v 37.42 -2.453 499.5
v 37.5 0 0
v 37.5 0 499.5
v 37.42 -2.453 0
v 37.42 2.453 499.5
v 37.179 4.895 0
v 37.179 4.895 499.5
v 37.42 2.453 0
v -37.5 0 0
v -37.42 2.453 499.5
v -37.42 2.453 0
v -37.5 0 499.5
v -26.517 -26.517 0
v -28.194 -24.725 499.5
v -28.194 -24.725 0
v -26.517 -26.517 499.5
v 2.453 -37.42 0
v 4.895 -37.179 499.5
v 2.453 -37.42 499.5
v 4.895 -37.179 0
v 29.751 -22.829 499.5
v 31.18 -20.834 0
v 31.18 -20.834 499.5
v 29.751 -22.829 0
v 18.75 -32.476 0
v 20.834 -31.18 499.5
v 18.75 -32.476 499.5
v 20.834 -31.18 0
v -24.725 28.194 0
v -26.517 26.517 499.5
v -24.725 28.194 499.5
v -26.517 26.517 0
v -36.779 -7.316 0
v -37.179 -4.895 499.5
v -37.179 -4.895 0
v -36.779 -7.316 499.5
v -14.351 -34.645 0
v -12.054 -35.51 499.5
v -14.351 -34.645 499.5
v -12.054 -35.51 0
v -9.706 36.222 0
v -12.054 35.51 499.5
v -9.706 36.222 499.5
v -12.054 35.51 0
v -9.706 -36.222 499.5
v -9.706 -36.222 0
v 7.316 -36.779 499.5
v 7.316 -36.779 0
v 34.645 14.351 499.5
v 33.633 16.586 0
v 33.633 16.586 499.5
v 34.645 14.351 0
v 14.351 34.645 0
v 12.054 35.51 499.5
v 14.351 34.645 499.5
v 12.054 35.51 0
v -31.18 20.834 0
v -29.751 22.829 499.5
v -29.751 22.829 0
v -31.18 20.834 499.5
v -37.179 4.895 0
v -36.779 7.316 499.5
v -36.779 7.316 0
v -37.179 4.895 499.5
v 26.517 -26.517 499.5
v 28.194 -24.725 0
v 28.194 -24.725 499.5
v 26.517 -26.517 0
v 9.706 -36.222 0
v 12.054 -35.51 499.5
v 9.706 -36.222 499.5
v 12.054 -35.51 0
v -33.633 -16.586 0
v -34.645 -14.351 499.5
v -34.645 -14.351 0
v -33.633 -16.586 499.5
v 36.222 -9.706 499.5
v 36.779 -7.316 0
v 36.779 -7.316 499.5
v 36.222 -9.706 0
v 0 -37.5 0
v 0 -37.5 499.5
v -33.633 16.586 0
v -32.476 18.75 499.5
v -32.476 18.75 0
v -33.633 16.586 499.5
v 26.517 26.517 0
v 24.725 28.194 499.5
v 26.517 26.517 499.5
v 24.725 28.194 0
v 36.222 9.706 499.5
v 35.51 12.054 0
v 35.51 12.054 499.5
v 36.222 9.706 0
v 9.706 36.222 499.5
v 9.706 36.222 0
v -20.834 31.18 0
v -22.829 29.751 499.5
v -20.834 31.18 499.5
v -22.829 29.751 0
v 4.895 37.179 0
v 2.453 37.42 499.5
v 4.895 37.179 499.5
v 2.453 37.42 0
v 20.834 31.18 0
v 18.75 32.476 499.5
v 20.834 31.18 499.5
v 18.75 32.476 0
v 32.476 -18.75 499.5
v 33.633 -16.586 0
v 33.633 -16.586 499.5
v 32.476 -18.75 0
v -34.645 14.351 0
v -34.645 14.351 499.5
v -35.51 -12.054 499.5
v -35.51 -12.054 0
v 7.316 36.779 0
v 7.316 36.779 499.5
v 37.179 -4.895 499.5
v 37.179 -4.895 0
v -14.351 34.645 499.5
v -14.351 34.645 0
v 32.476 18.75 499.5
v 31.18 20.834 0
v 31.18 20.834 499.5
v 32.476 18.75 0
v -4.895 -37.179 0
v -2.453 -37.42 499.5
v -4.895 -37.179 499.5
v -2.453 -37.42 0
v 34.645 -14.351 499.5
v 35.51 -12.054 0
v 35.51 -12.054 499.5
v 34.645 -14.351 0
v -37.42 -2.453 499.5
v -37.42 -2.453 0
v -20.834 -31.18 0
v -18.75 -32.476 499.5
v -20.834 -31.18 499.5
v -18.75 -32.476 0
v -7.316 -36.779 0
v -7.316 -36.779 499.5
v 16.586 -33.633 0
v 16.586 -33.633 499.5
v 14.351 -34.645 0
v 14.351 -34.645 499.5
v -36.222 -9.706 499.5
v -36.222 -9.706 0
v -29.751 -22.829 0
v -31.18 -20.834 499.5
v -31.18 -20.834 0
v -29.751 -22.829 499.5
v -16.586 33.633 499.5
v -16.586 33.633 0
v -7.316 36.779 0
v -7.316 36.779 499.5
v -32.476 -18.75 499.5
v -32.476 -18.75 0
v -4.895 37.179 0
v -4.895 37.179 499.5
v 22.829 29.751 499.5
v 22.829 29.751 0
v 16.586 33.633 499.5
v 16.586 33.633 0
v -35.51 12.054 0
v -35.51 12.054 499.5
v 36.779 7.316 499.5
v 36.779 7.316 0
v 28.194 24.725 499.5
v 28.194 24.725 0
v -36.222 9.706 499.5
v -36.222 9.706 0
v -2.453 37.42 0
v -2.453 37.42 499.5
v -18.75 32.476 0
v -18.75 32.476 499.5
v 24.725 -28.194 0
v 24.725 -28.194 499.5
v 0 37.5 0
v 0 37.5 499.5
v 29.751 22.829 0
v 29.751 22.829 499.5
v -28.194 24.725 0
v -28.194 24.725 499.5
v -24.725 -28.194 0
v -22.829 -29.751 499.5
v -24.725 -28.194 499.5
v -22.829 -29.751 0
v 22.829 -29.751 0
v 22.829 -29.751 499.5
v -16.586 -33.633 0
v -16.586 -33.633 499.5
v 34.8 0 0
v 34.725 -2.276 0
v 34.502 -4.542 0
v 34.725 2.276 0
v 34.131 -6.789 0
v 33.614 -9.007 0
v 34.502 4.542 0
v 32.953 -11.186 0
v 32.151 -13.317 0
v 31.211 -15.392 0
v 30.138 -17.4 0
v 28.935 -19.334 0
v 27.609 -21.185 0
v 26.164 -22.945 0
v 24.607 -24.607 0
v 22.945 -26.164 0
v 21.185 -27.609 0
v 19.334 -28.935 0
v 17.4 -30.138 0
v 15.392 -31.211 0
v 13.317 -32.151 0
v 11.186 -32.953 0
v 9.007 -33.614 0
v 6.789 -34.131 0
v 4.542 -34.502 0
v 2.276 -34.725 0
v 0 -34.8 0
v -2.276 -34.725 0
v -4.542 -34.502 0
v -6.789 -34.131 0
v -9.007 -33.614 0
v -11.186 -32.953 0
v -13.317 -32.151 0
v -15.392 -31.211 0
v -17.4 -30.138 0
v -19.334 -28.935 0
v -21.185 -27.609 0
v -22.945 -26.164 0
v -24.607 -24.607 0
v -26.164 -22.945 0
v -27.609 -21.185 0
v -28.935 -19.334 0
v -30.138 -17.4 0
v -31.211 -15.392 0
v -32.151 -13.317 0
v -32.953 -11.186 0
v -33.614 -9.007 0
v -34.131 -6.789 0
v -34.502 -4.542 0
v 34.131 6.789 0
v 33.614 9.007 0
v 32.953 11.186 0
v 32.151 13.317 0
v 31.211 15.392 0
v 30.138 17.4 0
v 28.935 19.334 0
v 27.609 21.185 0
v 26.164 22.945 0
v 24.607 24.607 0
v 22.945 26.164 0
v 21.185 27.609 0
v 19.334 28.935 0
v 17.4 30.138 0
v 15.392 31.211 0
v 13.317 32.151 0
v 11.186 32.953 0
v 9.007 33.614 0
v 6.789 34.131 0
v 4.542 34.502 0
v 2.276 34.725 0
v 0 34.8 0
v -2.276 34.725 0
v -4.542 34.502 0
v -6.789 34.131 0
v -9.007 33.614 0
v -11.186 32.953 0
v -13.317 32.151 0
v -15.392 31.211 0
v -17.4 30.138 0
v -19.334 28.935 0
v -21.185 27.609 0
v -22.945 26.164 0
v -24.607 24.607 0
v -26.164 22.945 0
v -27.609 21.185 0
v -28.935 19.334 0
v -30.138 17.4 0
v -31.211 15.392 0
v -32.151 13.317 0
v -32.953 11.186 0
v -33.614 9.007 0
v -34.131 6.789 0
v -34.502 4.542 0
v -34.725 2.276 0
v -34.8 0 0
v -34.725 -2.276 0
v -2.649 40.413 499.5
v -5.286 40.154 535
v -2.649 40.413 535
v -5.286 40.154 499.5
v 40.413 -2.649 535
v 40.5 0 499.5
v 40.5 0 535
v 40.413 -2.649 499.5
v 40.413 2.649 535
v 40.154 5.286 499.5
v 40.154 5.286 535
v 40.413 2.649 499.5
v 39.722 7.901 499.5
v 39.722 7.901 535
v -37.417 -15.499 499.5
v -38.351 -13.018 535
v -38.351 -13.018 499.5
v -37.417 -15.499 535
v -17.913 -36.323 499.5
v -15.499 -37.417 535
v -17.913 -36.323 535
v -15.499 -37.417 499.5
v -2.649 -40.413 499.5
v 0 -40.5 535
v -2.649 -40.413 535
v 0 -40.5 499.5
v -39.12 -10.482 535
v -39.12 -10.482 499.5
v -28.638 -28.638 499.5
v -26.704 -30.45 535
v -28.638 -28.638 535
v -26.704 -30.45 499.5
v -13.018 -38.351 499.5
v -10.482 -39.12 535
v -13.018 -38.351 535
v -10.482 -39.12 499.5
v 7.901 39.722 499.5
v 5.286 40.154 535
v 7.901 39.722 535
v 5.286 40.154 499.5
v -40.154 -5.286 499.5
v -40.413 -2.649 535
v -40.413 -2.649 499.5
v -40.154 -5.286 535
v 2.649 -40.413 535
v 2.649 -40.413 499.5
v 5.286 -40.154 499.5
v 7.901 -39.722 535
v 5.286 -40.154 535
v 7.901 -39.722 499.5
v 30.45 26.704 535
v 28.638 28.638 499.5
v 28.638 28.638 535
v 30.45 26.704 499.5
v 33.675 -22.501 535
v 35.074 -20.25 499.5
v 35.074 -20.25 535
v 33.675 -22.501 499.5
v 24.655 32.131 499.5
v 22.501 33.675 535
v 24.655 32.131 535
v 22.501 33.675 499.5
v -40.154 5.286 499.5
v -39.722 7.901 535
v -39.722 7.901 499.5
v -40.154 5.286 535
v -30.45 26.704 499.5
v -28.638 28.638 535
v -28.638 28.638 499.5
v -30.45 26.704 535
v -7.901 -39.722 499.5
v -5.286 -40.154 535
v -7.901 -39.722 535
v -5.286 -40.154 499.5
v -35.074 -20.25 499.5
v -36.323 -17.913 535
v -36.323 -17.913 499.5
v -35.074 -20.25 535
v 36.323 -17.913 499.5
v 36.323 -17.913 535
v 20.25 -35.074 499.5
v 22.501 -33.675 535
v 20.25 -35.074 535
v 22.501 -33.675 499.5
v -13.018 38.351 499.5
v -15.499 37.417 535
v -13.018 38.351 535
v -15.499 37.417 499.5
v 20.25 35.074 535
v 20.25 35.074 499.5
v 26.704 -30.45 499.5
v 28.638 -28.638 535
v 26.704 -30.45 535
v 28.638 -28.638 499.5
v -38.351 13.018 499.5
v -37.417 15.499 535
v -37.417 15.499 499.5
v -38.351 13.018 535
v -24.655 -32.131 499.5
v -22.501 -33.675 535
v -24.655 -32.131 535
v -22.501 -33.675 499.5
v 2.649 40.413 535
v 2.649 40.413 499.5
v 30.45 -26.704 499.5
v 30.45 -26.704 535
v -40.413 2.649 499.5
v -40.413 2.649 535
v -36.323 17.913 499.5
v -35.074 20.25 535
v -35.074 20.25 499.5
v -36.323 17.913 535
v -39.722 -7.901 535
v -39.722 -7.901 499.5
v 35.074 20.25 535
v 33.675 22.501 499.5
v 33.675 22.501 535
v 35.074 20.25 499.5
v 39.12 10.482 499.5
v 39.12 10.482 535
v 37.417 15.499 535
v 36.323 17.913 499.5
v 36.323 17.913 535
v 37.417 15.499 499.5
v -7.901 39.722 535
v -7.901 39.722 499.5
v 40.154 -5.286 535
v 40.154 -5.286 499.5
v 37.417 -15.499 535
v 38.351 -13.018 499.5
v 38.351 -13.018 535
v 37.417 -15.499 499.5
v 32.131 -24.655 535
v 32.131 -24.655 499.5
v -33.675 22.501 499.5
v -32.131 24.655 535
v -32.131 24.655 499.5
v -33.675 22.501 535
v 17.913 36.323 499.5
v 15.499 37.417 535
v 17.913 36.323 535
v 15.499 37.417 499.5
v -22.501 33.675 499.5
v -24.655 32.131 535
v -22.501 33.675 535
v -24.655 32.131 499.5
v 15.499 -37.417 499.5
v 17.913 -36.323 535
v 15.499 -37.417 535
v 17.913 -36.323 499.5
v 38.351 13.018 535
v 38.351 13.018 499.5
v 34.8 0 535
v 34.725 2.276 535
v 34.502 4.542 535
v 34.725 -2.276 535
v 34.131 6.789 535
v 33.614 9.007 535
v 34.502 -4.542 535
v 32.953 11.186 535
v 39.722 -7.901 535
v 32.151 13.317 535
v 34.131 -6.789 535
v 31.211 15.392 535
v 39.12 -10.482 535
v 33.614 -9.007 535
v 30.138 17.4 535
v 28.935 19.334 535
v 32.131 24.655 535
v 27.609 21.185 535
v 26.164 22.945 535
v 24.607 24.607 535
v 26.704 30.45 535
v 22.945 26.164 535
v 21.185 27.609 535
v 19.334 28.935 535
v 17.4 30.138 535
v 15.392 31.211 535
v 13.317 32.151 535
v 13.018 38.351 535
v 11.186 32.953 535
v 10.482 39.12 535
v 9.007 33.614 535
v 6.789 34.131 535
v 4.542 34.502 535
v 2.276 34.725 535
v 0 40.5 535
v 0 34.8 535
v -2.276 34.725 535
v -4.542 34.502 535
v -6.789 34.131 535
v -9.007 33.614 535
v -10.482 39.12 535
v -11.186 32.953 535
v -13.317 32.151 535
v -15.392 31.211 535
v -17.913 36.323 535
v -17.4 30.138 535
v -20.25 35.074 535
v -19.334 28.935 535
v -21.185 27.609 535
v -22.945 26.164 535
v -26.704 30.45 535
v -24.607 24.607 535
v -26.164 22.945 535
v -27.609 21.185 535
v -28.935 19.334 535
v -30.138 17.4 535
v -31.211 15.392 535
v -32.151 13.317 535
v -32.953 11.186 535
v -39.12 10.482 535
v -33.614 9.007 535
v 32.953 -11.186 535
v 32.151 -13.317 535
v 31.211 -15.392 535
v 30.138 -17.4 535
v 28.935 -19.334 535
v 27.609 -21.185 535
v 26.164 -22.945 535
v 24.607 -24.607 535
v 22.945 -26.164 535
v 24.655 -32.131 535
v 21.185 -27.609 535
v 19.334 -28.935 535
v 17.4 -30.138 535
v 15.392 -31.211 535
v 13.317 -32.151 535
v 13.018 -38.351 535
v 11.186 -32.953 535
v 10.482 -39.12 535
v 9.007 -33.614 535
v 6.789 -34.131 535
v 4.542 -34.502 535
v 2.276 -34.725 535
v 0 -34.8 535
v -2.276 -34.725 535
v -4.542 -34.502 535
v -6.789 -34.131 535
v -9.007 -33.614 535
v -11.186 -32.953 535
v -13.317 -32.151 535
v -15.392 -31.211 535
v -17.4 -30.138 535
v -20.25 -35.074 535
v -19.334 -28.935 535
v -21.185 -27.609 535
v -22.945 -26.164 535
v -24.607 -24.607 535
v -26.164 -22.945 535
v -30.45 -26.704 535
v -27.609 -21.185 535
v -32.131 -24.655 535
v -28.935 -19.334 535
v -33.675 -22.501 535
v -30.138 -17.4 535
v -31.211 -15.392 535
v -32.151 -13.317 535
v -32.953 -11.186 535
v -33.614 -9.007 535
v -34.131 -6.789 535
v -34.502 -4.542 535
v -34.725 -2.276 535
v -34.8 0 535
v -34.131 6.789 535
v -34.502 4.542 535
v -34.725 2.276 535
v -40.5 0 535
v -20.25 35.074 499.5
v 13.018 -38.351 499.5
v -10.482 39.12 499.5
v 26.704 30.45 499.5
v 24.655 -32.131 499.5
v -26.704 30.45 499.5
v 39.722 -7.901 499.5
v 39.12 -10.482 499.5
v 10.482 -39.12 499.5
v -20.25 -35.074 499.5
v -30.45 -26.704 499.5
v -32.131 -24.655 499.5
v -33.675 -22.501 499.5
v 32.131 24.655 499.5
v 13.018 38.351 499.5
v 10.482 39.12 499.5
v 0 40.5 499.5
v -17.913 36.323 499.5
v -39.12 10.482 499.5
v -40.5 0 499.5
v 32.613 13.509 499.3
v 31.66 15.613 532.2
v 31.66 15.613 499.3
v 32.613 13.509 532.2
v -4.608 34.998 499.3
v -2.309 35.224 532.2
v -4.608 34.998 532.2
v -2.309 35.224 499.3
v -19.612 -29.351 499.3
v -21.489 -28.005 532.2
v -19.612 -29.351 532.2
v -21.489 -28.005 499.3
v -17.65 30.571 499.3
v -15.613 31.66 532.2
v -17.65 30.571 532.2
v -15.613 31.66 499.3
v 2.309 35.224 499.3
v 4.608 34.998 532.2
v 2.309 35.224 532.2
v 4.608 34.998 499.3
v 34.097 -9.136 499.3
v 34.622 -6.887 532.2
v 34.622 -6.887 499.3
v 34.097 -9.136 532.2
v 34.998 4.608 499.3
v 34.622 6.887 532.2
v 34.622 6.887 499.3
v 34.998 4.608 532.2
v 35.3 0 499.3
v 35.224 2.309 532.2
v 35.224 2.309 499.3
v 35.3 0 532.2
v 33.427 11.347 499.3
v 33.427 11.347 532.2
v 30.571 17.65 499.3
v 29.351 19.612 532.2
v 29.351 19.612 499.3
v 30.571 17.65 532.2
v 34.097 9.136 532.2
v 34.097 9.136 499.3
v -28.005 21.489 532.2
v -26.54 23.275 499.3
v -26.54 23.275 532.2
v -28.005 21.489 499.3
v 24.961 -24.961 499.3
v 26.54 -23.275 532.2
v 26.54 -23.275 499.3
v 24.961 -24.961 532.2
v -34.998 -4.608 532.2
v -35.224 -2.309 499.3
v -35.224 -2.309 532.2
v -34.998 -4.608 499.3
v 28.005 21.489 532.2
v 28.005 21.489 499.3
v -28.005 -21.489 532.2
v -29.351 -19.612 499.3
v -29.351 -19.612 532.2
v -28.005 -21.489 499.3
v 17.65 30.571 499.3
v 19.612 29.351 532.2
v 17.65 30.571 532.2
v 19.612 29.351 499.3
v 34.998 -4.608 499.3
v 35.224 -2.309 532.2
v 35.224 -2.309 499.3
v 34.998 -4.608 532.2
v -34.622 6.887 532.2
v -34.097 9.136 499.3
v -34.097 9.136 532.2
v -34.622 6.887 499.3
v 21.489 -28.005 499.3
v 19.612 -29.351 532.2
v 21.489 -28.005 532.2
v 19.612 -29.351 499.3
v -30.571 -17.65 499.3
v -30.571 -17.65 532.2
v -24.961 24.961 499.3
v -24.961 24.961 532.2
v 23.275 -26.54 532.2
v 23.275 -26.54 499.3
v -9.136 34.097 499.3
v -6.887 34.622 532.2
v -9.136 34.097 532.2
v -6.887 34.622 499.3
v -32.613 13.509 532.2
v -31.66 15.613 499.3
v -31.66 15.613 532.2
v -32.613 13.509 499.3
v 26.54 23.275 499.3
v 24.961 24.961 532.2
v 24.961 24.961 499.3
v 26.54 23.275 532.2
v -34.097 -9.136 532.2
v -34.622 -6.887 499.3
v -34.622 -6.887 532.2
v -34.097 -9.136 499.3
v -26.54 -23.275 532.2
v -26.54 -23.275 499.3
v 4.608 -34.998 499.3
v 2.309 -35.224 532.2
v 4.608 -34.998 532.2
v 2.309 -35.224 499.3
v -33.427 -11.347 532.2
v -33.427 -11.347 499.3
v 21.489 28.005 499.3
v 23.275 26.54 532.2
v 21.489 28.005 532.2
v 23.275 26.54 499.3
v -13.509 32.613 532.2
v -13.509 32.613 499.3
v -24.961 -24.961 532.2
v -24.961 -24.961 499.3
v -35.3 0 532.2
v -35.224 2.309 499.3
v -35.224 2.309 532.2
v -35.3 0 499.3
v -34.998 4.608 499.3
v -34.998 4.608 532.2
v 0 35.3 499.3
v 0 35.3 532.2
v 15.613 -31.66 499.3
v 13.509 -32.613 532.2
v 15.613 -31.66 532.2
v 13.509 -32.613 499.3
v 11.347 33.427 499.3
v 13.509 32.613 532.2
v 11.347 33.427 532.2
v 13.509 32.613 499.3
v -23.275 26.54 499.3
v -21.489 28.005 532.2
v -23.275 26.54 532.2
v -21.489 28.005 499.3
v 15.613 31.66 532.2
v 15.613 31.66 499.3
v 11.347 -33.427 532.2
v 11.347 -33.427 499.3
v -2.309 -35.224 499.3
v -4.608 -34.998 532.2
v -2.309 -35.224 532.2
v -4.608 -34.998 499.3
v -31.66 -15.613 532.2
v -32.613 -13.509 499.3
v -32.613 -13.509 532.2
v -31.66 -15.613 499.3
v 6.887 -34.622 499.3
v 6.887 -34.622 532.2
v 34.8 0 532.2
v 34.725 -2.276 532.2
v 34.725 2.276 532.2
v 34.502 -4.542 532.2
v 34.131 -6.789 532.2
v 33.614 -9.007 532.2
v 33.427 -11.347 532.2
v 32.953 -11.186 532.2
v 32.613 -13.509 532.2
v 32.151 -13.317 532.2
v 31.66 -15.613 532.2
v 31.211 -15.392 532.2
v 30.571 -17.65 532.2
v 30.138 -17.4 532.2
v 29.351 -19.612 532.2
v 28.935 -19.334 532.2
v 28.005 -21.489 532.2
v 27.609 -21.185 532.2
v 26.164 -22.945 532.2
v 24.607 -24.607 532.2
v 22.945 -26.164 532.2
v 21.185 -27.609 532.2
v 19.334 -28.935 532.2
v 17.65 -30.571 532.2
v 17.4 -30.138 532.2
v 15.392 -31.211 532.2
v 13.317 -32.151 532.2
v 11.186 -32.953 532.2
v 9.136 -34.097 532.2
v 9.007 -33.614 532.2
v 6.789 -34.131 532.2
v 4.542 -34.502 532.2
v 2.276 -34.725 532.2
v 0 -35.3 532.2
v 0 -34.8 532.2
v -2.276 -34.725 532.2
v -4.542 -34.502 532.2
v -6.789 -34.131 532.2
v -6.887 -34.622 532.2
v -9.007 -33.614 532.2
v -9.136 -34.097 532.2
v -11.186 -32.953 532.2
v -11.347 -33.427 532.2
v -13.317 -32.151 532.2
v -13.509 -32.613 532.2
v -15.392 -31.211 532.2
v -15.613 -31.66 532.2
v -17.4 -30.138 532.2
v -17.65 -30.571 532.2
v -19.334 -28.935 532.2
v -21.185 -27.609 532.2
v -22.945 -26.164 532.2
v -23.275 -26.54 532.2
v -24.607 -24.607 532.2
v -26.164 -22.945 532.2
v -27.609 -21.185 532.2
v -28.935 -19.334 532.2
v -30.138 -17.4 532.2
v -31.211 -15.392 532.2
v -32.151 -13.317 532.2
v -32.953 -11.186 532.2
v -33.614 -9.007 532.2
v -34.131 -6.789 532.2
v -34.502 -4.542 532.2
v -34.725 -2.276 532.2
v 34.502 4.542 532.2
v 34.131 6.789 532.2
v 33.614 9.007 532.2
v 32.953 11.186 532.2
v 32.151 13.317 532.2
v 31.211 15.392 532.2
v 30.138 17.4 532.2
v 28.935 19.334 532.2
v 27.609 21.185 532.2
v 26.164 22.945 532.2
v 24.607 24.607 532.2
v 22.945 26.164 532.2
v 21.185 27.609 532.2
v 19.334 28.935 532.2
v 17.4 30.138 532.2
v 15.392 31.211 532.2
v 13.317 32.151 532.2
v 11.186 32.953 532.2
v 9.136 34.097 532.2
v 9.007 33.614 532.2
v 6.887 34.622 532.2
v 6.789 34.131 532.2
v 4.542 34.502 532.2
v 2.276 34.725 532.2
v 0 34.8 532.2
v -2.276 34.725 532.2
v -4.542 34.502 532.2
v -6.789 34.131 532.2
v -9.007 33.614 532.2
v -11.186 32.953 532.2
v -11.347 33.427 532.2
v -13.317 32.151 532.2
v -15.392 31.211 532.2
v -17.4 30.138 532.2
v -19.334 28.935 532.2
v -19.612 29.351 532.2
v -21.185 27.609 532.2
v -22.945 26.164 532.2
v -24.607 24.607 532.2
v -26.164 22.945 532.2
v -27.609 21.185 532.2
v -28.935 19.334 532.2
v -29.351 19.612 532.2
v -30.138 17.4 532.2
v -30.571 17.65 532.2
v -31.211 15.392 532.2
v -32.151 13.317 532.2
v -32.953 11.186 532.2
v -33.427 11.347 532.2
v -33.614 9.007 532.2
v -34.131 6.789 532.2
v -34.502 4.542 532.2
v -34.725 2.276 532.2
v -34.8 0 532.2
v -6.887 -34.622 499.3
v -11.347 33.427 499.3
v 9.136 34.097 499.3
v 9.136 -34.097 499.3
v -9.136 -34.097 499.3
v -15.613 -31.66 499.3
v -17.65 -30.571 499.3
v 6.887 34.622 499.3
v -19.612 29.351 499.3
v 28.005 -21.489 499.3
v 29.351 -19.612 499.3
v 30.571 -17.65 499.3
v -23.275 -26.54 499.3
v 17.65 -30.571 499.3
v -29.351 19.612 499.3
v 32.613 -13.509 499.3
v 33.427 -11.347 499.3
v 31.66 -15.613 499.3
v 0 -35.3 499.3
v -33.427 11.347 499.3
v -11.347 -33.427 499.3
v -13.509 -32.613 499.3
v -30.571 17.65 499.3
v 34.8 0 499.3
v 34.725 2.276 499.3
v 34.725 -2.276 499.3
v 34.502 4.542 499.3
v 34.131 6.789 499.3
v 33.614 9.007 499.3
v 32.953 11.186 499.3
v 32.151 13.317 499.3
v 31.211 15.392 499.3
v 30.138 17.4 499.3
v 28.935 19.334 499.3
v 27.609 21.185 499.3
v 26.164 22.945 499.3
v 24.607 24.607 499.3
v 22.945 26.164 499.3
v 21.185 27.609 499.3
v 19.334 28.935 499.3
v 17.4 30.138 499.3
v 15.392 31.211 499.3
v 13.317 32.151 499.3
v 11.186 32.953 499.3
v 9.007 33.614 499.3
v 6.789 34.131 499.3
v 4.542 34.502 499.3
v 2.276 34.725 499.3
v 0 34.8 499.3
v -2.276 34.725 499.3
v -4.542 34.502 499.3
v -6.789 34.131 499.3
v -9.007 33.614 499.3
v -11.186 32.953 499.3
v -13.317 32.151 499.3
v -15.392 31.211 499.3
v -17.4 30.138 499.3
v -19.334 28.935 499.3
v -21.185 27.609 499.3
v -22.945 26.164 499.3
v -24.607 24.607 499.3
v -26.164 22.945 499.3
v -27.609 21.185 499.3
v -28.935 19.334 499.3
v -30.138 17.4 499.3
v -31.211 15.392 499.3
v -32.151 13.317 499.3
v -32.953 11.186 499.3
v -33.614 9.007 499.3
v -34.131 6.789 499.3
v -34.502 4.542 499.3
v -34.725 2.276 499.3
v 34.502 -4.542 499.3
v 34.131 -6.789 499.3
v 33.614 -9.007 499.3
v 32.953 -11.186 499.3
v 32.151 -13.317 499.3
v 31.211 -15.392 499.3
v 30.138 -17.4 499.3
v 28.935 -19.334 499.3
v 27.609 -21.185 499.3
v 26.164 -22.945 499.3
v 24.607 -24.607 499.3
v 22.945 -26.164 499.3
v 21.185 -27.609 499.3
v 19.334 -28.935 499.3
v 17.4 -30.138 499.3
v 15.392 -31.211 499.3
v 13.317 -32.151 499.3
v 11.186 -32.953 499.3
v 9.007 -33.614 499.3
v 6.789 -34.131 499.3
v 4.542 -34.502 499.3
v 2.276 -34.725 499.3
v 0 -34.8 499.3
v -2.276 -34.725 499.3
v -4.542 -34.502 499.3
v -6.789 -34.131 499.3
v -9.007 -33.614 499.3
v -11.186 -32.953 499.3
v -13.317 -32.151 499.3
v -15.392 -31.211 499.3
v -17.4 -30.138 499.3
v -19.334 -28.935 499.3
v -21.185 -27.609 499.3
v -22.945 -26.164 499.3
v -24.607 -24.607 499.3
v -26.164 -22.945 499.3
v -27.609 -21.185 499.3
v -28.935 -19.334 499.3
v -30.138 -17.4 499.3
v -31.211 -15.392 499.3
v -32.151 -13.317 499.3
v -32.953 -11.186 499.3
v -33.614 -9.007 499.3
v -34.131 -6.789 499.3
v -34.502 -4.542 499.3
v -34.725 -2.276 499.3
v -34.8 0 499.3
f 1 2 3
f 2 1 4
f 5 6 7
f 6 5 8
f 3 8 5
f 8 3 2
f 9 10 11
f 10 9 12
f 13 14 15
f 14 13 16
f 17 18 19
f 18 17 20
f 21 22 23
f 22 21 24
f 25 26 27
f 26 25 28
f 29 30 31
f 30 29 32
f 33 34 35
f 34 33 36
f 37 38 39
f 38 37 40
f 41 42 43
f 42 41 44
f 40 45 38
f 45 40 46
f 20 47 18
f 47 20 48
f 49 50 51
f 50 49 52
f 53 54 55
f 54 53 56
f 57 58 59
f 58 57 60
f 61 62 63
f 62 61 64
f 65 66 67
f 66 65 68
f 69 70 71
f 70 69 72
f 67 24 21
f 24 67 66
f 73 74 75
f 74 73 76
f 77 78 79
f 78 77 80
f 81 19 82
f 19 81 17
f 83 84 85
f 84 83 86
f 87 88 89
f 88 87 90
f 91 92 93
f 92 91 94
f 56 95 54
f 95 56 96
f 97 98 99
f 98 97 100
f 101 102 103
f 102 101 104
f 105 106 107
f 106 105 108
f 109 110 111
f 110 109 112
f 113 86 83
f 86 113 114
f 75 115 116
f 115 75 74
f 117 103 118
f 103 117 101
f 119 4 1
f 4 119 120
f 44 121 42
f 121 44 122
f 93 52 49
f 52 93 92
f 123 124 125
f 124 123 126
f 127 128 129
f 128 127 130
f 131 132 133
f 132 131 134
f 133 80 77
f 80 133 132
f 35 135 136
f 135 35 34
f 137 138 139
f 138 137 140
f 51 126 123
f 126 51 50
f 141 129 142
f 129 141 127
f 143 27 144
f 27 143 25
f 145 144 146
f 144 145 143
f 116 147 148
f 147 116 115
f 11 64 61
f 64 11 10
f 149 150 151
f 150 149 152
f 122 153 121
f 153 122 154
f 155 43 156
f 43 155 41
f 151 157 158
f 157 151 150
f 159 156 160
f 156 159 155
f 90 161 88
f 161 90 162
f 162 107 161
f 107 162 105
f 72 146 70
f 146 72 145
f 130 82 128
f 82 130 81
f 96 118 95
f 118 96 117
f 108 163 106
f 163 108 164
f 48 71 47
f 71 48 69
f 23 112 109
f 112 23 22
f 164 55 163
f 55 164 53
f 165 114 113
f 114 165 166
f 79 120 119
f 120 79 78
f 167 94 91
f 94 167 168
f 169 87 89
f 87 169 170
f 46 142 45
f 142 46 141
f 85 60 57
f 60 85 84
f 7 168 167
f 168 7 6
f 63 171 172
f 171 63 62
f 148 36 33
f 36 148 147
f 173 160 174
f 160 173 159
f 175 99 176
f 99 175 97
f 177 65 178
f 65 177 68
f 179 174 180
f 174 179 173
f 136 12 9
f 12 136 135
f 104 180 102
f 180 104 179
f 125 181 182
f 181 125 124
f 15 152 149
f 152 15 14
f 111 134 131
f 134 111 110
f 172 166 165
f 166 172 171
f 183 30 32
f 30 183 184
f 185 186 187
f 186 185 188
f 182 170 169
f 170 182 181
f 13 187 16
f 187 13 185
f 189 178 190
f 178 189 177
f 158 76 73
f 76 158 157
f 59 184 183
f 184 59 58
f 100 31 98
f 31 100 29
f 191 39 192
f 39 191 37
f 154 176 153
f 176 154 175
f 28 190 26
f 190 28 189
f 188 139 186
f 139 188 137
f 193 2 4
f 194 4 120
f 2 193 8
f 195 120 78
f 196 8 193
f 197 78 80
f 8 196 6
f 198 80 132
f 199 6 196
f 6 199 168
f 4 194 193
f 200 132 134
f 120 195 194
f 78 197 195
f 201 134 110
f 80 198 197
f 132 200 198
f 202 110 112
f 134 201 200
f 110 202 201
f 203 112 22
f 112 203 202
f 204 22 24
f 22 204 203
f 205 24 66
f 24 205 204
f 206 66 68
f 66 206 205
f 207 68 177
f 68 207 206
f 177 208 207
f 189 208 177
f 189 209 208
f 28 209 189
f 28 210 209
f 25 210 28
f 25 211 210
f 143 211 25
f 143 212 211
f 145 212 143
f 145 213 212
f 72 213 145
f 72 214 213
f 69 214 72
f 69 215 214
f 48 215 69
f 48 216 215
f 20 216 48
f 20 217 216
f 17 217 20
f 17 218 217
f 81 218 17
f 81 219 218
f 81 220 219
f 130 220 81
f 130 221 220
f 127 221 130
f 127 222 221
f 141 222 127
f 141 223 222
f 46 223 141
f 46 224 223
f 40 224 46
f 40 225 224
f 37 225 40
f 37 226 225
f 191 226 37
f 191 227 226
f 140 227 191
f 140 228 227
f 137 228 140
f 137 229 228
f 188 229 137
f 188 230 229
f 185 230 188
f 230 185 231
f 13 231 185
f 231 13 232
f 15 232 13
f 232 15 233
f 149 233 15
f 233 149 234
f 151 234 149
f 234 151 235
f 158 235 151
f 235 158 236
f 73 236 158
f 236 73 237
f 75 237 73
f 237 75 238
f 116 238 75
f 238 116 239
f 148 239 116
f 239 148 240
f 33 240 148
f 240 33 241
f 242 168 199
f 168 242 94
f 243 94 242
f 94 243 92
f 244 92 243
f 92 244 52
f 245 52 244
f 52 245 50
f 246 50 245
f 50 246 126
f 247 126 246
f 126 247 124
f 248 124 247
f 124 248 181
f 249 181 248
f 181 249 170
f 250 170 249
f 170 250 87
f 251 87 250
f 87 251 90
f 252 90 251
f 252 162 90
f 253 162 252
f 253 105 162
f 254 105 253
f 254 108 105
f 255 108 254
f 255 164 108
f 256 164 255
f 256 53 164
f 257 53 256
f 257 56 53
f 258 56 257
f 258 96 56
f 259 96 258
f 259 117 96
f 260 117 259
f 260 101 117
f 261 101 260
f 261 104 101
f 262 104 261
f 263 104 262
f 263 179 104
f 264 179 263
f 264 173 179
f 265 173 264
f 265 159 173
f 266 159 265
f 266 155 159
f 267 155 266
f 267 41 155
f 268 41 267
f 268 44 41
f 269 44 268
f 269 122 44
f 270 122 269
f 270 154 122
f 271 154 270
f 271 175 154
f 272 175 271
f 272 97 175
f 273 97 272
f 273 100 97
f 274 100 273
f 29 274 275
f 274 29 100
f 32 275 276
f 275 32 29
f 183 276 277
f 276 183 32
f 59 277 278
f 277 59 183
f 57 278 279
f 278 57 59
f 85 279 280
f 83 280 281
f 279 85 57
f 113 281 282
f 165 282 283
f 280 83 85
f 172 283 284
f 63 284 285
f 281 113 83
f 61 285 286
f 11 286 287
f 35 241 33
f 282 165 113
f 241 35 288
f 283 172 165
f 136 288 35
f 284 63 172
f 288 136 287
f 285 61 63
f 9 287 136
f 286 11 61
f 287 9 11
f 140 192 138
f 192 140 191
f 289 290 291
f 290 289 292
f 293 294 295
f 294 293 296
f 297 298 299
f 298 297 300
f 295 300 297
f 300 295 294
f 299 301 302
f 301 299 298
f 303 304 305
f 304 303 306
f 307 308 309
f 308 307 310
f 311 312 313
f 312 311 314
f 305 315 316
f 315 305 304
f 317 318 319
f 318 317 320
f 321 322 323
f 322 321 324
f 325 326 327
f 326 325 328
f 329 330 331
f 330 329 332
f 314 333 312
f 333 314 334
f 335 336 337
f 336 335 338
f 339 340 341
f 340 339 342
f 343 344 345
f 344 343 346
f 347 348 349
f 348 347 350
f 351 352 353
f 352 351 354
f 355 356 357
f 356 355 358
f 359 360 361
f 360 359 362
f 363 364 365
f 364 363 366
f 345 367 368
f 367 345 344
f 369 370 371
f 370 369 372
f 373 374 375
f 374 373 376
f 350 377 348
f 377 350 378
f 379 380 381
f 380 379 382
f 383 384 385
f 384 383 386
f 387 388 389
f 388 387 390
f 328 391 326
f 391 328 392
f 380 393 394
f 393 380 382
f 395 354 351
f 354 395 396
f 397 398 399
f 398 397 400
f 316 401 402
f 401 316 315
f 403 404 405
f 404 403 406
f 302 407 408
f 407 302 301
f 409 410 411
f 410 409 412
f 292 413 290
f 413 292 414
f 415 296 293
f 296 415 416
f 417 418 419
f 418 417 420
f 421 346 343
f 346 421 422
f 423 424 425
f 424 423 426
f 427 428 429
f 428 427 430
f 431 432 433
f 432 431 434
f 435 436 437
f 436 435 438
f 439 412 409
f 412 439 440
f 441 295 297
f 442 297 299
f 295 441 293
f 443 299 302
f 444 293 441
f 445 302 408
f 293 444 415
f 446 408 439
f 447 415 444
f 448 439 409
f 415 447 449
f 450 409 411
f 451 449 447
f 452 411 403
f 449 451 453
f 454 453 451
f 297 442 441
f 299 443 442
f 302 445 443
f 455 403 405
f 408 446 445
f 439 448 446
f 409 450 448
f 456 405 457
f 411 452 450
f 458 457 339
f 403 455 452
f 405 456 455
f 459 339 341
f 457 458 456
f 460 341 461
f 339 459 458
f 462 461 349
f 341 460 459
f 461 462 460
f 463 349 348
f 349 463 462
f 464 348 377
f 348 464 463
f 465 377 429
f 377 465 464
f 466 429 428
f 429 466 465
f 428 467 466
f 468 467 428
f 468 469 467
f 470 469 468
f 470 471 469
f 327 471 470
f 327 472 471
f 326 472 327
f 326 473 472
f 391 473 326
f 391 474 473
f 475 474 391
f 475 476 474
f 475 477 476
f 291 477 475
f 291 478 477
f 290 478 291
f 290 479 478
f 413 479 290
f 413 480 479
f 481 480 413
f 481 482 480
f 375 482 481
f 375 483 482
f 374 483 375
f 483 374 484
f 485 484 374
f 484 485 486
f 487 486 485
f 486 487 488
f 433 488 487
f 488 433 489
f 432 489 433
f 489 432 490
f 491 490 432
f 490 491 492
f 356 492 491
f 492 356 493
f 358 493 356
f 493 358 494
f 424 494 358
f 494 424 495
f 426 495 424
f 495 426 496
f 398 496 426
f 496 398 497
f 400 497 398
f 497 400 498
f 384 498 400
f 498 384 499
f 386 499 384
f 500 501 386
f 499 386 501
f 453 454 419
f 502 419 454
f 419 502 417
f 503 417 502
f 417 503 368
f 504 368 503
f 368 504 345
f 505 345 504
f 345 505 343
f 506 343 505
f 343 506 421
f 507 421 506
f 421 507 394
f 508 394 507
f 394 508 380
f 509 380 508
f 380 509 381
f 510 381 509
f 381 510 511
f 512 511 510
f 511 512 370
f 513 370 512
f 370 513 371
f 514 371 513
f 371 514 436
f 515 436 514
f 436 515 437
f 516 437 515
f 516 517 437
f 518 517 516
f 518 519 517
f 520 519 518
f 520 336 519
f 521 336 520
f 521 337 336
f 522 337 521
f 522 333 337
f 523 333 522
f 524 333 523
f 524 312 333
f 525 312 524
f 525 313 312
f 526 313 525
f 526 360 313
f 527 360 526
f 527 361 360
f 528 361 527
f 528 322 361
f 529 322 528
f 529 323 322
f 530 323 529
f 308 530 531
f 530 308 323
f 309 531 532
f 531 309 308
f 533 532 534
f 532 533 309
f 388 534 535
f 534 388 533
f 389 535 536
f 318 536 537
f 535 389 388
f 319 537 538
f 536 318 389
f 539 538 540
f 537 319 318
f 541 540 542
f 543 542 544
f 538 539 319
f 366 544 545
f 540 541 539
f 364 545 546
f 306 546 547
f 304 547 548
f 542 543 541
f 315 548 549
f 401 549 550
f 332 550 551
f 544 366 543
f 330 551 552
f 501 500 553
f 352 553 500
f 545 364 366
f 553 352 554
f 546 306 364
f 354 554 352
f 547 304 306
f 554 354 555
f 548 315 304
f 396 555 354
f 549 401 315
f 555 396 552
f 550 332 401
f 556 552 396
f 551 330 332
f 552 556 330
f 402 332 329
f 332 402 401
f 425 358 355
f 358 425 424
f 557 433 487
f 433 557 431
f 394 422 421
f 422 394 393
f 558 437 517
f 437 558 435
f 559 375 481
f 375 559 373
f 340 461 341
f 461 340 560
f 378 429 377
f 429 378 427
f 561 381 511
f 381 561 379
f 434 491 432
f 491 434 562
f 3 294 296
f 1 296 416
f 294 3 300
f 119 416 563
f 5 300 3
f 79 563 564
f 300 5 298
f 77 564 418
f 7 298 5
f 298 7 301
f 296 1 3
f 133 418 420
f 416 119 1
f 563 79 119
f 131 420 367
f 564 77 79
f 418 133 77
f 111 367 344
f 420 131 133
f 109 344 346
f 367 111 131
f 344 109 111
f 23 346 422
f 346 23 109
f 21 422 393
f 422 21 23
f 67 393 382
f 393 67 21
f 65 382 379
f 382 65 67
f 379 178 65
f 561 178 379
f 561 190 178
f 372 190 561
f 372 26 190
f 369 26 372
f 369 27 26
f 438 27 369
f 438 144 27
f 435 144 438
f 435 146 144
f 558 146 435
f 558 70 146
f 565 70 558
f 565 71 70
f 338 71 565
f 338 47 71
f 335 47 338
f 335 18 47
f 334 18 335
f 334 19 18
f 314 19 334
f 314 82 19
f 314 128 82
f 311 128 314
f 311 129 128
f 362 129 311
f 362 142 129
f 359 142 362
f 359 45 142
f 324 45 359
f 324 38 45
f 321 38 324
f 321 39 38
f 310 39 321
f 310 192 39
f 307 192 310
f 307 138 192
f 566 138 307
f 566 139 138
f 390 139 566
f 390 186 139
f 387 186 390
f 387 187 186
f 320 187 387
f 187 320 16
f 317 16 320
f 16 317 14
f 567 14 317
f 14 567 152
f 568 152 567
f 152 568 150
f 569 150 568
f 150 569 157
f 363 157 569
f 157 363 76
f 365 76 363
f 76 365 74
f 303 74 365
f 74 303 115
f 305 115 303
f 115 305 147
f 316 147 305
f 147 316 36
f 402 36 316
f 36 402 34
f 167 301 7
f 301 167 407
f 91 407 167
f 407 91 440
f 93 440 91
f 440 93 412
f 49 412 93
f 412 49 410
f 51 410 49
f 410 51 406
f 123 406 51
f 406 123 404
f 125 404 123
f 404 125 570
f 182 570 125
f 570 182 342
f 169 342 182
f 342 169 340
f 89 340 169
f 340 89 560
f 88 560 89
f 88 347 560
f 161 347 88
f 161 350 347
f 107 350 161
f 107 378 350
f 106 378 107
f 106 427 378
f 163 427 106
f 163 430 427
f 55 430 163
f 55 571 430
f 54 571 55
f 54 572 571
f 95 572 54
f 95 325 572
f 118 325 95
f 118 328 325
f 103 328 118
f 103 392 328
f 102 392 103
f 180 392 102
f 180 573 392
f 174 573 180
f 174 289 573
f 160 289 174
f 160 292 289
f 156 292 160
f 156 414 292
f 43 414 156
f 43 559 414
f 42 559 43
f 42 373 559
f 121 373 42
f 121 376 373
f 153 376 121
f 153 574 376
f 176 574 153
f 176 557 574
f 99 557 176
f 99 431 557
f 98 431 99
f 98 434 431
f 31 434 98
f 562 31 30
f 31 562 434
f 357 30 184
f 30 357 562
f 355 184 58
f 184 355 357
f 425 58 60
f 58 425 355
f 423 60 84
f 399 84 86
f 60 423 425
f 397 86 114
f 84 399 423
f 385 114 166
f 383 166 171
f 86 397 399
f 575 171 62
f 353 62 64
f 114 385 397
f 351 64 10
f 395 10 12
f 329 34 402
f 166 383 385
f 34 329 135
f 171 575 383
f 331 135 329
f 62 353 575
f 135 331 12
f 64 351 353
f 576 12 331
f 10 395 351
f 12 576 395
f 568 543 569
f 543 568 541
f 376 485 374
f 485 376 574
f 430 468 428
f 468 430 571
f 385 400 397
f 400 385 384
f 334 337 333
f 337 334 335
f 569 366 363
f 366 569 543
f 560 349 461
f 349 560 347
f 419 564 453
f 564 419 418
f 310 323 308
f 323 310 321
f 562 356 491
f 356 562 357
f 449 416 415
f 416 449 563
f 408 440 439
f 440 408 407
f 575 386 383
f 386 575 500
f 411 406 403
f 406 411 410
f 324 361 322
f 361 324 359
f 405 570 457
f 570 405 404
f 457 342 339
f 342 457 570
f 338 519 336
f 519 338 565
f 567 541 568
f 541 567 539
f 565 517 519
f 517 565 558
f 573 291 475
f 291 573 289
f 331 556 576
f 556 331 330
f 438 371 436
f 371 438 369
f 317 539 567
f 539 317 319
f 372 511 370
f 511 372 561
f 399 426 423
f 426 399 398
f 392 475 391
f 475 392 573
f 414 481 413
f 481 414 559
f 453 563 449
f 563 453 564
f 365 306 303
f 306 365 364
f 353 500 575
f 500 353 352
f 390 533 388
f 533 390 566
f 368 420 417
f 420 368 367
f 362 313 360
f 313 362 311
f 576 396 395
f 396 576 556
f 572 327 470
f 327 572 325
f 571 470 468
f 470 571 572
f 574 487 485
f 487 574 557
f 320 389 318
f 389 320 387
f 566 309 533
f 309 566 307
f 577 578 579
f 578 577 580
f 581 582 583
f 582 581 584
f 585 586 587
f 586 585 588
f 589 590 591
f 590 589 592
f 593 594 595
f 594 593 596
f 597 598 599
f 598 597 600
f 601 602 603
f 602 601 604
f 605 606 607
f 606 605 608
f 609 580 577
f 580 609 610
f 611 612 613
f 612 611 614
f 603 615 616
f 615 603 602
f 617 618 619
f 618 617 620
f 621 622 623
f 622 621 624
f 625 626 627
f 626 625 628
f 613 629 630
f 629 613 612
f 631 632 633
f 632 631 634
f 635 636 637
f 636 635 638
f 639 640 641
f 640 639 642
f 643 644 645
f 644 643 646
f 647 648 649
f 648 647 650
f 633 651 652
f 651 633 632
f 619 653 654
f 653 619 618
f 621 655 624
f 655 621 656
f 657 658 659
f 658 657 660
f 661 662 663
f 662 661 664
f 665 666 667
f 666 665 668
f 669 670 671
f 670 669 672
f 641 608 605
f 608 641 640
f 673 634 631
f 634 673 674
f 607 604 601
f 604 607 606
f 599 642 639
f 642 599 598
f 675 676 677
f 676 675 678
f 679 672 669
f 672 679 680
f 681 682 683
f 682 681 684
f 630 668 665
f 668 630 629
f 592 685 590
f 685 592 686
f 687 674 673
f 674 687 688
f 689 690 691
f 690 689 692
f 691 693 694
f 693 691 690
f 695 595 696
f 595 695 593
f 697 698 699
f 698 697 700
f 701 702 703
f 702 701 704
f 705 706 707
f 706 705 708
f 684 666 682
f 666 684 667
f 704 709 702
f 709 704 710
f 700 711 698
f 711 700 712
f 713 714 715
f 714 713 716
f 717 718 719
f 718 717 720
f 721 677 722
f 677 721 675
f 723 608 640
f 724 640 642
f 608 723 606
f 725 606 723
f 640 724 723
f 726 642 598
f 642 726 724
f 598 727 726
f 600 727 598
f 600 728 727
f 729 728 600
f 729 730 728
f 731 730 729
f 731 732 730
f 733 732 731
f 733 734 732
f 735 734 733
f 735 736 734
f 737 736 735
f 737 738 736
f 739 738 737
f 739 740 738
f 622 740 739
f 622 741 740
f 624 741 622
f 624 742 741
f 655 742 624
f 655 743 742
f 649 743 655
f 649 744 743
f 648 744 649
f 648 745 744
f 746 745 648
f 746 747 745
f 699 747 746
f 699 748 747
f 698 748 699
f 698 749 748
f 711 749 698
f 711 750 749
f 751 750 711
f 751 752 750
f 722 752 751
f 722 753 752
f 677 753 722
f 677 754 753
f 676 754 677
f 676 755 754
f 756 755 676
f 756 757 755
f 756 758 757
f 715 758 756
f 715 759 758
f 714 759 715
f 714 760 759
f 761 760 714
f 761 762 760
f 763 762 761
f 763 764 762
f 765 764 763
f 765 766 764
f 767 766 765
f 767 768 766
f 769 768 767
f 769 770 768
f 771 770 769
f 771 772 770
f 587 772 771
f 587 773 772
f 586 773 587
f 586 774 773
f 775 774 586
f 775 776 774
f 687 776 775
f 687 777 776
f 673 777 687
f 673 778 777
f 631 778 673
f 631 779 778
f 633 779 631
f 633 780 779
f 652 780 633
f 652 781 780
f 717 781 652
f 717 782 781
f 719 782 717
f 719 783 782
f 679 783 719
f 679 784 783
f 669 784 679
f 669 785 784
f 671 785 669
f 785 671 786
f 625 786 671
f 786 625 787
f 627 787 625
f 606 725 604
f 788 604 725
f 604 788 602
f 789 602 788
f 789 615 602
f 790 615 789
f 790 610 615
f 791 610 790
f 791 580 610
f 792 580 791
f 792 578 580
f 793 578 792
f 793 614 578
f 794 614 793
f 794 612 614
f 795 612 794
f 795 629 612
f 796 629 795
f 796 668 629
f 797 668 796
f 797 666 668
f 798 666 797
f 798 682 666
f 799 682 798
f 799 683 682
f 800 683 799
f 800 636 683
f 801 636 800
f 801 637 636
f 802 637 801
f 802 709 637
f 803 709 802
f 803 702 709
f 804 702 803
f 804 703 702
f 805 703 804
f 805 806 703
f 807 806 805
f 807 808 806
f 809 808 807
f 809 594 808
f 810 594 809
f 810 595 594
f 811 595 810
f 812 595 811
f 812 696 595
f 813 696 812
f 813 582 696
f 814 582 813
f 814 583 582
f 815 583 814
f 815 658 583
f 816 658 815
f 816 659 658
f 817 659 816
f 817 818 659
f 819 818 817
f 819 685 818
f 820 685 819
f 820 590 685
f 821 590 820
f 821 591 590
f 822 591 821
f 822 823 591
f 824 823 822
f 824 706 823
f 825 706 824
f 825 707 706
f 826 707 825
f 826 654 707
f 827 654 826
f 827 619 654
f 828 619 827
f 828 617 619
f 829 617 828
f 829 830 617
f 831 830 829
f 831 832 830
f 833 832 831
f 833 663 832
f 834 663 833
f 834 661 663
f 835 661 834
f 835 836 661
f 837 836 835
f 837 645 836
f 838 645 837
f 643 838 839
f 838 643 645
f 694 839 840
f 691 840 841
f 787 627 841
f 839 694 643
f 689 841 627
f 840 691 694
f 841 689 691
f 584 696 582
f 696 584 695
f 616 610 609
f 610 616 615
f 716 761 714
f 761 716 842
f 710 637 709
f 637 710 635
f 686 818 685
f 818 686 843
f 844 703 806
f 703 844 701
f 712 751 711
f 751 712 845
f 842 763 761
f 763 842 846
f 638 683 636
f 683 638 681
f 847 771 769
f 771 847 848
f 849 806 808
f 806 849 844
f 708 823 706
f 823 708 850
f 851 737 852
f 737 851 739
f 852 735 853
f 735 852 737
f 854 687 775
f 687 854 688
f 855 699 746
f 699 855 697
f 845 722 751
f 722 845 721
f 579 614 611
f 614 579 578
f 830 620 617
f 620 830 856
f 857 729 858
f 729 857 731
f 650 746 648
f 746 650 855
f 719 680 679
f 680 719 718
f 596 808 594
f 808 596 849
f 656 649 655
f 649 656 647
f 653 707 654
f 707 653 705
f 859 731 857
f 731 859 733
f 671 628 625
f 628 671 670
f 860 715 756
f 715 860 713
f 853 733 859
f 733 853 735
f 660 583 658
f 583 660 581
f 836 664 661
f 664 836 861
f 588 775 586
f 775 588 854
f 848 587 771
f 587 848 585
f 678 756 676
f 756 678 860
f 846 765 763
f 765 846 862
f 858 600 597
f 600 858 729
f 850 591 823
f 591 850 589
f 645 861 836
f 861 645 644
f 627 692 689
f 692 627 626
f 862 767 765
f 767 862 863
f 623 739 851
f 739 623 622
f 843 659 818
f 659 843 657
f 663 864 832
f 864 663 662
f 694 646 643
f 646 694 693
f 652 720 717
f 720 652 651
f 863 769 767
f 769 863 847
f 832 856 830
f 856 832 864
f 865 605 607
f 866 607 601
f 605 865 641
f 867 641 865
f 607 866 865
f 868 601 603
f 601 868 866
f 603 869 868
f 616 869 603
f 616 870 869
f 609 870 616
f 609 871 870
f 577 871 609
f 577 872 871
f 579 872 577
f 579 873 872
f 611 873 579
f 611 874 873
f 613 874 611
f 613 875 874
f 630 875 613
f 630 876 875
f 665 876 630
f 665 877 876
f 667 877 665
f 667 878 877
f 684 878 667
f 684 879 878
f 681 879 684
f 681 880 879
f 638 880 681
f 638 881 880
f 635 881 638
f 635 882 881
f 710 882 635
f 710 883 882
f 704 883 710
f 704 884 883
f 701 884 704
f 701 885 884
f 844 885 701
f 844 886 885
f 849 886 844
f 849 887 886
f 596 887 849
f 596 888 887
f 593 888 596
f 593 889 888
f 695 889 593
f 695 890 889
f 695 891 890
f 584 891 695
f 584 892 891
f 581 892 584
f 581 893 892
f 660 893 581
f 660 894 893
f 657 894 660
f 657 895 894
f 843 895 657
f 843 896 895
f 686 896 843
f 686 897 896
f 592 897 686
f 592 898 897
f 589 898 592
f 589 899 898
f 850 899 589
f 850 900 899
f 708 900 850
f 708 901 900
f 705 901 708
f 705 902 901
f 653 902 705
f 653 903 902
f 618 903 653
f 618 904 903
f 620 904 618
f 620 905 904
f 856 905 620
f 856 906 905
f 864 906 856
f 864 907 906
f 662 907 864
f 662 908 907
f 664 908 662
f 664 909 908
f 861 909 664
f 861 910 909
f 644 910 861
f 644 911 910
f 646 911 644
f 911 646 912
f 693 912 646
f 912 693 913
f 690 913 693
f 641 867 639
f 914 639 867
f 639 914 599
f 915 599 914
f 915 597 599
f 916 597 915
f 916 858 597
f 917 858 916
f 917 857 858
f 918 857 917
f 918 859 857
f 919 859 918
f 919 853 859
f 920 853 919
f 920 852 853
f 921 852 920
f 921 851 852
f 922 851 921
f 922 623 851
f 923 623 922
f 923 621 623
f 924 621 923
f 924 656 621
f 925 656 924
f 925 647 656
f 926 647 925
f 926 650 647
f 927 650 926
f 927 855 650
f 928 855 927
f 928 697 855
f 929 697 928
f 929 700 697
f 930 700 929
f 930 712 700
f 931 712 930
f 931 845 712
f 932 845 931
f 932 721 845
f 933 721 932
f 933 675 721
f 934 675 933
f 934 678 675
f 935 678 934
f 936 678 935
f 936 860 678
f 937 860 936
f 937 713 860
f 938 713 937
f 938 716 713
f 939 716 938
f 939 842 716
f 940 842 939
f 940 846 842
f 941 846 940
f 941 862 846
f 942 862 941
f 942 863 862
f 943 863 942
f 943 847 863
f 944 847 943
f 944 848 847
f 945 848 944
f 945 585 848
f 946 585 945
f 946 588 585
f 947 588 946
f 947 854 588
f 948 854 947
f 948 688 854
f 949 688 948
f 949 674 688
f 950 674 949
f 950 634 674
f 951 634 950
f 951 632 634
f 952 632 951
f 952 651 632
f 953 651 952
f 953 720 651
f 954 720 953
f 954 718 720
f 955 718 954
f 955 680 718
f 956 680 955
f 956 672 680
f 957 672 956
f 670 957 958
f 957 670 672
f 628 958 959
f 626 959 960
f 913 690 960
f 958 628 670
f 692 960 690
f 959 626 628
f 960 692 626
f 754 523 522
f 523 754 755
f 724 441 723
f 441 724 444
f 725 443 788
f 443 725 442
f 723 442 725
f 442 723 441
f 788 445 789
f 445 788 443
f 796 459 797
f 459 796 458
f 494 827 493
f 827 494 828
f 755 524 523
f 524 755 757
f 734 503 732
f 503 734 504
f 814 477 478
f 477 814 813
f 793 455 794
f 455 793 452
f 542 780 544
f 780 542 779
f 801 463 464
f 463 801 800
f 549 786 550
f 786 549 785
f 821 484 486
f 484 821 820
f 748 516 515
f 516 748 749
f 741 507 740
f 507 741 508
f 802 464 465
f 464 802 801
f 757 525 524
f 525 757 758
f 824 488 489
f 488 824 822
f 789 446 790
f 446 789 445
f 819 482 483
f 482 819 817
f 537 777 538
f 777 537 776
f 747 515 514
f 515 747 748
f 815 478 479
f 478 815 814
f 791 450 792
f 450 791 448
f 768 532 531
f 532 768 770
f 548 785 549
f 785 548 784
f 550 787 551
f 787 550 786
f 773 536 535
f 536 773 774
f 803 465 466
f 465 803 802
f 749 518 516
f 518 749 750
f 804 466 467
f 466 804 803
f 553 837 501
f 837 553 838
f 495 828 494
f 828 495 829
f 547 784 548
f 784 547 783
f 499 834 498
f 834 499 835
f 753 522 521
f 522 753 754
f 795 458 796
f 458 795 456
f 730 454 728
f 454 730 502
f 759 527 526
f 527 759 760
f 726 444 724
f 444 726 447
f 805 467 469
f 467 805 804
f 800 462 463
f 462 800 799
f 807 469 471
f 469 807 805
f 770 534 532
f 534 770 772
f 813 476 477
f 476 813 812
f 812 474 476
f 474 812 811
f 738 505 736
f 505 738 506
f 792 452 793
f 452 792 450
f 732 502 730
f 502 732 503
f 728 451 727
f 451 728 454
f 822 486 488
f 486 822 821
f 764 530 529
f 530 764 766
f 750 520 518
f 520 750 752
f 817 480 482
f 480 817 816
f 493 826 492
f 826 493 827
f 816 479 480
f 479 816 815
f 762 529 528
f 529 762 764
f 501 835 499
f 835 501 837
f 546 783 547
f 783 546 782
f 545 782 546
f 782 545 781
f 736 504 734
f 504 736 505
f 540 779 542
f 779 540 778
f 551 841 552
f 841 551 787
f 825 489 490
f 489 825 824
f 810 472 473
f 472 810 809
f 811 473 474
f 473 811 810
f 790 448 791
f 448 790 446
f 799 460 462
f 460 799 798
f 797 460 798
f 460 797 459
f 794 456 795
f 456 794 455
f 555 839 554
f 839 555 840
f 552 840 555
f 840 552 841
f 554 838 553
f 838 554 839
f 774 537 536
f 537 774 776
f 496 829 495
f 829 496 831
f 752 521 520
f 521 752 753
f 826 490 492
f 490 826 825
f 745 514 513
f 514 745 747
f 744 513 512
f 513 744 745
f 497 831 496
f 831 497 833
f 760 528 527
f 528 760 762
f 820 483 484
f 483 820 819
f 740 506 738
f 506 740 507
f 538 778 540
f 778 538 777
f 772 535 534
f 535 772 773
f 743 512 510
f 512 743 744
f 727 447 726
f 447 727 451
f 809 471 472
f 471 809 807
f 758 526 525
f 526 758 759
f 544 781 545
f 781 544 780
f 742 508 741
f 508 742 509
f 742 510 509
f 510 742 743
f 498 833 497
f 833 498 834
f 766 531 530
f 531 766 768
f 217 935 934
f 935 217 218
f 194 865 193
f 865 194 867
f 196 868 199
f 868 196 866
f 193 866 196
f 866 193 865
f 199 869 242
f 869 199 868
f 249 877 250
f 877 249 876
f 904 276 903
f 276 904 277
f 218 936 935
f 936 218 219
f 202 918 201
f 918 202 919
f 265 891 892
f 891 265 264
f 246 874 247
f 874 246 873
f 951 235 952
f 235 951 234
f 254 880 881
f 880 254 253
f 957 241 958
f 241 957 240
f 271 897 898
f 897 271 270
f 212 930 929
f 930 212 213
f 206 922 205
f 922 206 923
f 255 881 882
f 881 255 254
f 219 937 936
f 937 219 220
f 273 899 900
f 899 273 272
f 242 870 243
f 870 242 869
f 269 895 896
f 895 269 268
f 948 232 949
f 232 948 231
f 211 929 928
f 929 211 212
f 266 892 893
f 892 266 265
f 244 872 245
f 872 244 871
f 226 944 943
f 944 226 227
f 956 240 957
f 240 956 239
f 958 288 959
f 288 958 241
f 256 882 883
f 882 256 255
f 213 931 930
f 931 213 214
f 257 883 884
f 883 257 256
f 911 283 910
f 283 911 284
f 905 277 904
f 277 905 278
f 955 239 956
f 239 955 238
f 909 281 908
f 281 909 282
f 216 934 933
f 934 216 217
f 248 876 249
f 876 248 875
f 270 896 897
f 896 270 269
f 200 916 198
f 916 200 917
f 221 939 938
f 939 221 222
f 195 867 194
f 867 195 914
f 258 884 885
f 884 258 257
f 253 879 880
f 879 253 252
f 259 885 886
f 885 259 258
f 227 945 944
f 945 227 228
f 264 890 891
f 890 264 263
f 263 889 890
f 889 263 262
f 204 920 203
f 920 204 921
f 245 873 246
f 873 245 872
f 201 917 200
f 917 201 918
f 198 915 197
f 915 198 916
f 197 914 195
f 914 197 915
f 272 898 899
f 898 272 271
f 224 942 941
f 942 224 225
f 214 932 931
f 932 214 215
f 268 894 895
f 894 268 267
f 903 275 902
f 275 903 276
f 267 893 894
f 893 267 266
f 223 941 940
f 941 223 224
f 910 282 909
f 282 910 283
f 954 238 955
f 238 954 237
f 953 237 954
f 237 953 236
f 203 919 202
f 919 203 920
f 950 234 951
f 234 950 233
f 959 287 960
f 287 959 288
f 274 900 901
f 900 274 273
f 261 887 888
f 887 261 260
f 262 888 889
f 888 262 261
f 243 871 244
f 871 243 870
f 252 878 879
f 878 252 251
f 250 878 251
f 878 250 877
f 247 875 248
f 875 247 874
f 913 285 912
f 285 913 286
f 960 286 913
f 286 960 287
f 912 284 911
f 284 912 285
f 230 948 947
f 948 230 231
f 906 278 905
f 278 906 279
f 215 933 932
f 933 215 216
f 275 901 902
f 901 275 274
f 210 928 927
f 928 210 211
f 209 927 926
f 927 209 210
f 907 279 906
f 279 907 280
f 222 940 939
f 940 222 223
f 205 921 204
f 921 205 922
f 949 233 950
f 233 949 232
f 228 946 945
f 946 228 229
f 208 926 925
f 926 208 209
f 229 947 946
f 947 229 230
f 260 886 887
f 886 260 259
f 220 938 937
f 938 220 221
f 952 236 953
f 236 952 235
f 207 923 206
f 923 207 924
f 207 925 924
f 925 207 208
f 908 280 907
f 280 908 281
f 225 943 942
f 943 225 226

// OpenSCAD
// HT 75 pipe 500 mm (single connected solid)

// Parameters
nominal_diameter_mm = 75; //[40:150:1]
length_mm = 500; //[250:1000:1]
outer_diameter_mm = 75; //[40:150:0.1]
wall_thickness_mm = 2.7; //[1.3:5.4:0.1]
include_end_fitting = 1; //[0:1:1]
center = 0; //[0:1:1]

eps_mm = 0.2; //[0.05:1:0.05]
fitting_length_mm = 35; //[15:70:1]
fitting_od_extra_mm = 6; //[2:15:0.5]
fitting_bore_clearance_mm = 0.5; //[0.2:1.5:0.1]
fitting_stop_thickness_mm = 3; //[1:8:0.5]

$fn = 96;

// Derived
outer_r = outer_diameter_mm/2;
inner_r = max(0.01, outer_r - wall_thickness_mm);

fitting_outer_r = (outer_diameter_mm + fitting_od_extra_mm)/2;
fitting_bore_r  = inner_r + fitting_bore_clearance_mm;

// Z placement
z0 = center ? -length_mm/2 : 0;
pipe_z1 = z0 + length_mm;

// Ensure fitting overlaps pipe slightly so it's one connected solid
overlap_z = max(eps_mm, 0.5);

module ht_pipe() {
  // Clamp stop thickness to fitting length to avoid invalid geometry
  stop_t = min(fitting_stop_thickness_mm, fitting_length_mm);

  color([0.85, 0.85, 0.8])
  difference() {
    // OUTER SOLID (pipe + optional fitting) as one union
    union() {
      // Main outer pipe
      translate([0, 0, z0])
        cylinder(h=length_mm, r=outer_r, center=false);

      // End fitting (socket) on +Z end, overlapping into pipe
      if (include_end_fitting)
        translate([0, 0, pipe_z1 - overlap_z])
          cylinder(h=fitting_length_mm + overlap_z, r=fitting_outer_r, center=false);
    }

    // INNER VOID (bore + socket bore with internal stop shoulder)
    union() {
      // Main bore through entire pipe length
      translate([0, 0, z0 - eps_mm])
        cylinder(h=length_mm + 2*eps_mm, r=inner_r, center=false);

      if (include_end_fitting) {
        // Socket bore (slightly larger) ONLY up to the stop shoulder
        translate([0, 0, pipe_z1 - overlap_z - eps_mm])
          cylinder(h=(fitting_length_mm - stop_t) + overlap_z + 2*eps_mm, r=fitting_bore_r, center=false);

        // Stop region: returns to normal bore for the last stop_t of the fitting
        translate([0, 0, pipe_z1 + (fitting_length_mm - stop_t) - eps_mm])
          cylinder(h=stop_t + 2*eps_mm, r=inner_r, center=false);
      }
    }
  }
}

ht_pipe();
